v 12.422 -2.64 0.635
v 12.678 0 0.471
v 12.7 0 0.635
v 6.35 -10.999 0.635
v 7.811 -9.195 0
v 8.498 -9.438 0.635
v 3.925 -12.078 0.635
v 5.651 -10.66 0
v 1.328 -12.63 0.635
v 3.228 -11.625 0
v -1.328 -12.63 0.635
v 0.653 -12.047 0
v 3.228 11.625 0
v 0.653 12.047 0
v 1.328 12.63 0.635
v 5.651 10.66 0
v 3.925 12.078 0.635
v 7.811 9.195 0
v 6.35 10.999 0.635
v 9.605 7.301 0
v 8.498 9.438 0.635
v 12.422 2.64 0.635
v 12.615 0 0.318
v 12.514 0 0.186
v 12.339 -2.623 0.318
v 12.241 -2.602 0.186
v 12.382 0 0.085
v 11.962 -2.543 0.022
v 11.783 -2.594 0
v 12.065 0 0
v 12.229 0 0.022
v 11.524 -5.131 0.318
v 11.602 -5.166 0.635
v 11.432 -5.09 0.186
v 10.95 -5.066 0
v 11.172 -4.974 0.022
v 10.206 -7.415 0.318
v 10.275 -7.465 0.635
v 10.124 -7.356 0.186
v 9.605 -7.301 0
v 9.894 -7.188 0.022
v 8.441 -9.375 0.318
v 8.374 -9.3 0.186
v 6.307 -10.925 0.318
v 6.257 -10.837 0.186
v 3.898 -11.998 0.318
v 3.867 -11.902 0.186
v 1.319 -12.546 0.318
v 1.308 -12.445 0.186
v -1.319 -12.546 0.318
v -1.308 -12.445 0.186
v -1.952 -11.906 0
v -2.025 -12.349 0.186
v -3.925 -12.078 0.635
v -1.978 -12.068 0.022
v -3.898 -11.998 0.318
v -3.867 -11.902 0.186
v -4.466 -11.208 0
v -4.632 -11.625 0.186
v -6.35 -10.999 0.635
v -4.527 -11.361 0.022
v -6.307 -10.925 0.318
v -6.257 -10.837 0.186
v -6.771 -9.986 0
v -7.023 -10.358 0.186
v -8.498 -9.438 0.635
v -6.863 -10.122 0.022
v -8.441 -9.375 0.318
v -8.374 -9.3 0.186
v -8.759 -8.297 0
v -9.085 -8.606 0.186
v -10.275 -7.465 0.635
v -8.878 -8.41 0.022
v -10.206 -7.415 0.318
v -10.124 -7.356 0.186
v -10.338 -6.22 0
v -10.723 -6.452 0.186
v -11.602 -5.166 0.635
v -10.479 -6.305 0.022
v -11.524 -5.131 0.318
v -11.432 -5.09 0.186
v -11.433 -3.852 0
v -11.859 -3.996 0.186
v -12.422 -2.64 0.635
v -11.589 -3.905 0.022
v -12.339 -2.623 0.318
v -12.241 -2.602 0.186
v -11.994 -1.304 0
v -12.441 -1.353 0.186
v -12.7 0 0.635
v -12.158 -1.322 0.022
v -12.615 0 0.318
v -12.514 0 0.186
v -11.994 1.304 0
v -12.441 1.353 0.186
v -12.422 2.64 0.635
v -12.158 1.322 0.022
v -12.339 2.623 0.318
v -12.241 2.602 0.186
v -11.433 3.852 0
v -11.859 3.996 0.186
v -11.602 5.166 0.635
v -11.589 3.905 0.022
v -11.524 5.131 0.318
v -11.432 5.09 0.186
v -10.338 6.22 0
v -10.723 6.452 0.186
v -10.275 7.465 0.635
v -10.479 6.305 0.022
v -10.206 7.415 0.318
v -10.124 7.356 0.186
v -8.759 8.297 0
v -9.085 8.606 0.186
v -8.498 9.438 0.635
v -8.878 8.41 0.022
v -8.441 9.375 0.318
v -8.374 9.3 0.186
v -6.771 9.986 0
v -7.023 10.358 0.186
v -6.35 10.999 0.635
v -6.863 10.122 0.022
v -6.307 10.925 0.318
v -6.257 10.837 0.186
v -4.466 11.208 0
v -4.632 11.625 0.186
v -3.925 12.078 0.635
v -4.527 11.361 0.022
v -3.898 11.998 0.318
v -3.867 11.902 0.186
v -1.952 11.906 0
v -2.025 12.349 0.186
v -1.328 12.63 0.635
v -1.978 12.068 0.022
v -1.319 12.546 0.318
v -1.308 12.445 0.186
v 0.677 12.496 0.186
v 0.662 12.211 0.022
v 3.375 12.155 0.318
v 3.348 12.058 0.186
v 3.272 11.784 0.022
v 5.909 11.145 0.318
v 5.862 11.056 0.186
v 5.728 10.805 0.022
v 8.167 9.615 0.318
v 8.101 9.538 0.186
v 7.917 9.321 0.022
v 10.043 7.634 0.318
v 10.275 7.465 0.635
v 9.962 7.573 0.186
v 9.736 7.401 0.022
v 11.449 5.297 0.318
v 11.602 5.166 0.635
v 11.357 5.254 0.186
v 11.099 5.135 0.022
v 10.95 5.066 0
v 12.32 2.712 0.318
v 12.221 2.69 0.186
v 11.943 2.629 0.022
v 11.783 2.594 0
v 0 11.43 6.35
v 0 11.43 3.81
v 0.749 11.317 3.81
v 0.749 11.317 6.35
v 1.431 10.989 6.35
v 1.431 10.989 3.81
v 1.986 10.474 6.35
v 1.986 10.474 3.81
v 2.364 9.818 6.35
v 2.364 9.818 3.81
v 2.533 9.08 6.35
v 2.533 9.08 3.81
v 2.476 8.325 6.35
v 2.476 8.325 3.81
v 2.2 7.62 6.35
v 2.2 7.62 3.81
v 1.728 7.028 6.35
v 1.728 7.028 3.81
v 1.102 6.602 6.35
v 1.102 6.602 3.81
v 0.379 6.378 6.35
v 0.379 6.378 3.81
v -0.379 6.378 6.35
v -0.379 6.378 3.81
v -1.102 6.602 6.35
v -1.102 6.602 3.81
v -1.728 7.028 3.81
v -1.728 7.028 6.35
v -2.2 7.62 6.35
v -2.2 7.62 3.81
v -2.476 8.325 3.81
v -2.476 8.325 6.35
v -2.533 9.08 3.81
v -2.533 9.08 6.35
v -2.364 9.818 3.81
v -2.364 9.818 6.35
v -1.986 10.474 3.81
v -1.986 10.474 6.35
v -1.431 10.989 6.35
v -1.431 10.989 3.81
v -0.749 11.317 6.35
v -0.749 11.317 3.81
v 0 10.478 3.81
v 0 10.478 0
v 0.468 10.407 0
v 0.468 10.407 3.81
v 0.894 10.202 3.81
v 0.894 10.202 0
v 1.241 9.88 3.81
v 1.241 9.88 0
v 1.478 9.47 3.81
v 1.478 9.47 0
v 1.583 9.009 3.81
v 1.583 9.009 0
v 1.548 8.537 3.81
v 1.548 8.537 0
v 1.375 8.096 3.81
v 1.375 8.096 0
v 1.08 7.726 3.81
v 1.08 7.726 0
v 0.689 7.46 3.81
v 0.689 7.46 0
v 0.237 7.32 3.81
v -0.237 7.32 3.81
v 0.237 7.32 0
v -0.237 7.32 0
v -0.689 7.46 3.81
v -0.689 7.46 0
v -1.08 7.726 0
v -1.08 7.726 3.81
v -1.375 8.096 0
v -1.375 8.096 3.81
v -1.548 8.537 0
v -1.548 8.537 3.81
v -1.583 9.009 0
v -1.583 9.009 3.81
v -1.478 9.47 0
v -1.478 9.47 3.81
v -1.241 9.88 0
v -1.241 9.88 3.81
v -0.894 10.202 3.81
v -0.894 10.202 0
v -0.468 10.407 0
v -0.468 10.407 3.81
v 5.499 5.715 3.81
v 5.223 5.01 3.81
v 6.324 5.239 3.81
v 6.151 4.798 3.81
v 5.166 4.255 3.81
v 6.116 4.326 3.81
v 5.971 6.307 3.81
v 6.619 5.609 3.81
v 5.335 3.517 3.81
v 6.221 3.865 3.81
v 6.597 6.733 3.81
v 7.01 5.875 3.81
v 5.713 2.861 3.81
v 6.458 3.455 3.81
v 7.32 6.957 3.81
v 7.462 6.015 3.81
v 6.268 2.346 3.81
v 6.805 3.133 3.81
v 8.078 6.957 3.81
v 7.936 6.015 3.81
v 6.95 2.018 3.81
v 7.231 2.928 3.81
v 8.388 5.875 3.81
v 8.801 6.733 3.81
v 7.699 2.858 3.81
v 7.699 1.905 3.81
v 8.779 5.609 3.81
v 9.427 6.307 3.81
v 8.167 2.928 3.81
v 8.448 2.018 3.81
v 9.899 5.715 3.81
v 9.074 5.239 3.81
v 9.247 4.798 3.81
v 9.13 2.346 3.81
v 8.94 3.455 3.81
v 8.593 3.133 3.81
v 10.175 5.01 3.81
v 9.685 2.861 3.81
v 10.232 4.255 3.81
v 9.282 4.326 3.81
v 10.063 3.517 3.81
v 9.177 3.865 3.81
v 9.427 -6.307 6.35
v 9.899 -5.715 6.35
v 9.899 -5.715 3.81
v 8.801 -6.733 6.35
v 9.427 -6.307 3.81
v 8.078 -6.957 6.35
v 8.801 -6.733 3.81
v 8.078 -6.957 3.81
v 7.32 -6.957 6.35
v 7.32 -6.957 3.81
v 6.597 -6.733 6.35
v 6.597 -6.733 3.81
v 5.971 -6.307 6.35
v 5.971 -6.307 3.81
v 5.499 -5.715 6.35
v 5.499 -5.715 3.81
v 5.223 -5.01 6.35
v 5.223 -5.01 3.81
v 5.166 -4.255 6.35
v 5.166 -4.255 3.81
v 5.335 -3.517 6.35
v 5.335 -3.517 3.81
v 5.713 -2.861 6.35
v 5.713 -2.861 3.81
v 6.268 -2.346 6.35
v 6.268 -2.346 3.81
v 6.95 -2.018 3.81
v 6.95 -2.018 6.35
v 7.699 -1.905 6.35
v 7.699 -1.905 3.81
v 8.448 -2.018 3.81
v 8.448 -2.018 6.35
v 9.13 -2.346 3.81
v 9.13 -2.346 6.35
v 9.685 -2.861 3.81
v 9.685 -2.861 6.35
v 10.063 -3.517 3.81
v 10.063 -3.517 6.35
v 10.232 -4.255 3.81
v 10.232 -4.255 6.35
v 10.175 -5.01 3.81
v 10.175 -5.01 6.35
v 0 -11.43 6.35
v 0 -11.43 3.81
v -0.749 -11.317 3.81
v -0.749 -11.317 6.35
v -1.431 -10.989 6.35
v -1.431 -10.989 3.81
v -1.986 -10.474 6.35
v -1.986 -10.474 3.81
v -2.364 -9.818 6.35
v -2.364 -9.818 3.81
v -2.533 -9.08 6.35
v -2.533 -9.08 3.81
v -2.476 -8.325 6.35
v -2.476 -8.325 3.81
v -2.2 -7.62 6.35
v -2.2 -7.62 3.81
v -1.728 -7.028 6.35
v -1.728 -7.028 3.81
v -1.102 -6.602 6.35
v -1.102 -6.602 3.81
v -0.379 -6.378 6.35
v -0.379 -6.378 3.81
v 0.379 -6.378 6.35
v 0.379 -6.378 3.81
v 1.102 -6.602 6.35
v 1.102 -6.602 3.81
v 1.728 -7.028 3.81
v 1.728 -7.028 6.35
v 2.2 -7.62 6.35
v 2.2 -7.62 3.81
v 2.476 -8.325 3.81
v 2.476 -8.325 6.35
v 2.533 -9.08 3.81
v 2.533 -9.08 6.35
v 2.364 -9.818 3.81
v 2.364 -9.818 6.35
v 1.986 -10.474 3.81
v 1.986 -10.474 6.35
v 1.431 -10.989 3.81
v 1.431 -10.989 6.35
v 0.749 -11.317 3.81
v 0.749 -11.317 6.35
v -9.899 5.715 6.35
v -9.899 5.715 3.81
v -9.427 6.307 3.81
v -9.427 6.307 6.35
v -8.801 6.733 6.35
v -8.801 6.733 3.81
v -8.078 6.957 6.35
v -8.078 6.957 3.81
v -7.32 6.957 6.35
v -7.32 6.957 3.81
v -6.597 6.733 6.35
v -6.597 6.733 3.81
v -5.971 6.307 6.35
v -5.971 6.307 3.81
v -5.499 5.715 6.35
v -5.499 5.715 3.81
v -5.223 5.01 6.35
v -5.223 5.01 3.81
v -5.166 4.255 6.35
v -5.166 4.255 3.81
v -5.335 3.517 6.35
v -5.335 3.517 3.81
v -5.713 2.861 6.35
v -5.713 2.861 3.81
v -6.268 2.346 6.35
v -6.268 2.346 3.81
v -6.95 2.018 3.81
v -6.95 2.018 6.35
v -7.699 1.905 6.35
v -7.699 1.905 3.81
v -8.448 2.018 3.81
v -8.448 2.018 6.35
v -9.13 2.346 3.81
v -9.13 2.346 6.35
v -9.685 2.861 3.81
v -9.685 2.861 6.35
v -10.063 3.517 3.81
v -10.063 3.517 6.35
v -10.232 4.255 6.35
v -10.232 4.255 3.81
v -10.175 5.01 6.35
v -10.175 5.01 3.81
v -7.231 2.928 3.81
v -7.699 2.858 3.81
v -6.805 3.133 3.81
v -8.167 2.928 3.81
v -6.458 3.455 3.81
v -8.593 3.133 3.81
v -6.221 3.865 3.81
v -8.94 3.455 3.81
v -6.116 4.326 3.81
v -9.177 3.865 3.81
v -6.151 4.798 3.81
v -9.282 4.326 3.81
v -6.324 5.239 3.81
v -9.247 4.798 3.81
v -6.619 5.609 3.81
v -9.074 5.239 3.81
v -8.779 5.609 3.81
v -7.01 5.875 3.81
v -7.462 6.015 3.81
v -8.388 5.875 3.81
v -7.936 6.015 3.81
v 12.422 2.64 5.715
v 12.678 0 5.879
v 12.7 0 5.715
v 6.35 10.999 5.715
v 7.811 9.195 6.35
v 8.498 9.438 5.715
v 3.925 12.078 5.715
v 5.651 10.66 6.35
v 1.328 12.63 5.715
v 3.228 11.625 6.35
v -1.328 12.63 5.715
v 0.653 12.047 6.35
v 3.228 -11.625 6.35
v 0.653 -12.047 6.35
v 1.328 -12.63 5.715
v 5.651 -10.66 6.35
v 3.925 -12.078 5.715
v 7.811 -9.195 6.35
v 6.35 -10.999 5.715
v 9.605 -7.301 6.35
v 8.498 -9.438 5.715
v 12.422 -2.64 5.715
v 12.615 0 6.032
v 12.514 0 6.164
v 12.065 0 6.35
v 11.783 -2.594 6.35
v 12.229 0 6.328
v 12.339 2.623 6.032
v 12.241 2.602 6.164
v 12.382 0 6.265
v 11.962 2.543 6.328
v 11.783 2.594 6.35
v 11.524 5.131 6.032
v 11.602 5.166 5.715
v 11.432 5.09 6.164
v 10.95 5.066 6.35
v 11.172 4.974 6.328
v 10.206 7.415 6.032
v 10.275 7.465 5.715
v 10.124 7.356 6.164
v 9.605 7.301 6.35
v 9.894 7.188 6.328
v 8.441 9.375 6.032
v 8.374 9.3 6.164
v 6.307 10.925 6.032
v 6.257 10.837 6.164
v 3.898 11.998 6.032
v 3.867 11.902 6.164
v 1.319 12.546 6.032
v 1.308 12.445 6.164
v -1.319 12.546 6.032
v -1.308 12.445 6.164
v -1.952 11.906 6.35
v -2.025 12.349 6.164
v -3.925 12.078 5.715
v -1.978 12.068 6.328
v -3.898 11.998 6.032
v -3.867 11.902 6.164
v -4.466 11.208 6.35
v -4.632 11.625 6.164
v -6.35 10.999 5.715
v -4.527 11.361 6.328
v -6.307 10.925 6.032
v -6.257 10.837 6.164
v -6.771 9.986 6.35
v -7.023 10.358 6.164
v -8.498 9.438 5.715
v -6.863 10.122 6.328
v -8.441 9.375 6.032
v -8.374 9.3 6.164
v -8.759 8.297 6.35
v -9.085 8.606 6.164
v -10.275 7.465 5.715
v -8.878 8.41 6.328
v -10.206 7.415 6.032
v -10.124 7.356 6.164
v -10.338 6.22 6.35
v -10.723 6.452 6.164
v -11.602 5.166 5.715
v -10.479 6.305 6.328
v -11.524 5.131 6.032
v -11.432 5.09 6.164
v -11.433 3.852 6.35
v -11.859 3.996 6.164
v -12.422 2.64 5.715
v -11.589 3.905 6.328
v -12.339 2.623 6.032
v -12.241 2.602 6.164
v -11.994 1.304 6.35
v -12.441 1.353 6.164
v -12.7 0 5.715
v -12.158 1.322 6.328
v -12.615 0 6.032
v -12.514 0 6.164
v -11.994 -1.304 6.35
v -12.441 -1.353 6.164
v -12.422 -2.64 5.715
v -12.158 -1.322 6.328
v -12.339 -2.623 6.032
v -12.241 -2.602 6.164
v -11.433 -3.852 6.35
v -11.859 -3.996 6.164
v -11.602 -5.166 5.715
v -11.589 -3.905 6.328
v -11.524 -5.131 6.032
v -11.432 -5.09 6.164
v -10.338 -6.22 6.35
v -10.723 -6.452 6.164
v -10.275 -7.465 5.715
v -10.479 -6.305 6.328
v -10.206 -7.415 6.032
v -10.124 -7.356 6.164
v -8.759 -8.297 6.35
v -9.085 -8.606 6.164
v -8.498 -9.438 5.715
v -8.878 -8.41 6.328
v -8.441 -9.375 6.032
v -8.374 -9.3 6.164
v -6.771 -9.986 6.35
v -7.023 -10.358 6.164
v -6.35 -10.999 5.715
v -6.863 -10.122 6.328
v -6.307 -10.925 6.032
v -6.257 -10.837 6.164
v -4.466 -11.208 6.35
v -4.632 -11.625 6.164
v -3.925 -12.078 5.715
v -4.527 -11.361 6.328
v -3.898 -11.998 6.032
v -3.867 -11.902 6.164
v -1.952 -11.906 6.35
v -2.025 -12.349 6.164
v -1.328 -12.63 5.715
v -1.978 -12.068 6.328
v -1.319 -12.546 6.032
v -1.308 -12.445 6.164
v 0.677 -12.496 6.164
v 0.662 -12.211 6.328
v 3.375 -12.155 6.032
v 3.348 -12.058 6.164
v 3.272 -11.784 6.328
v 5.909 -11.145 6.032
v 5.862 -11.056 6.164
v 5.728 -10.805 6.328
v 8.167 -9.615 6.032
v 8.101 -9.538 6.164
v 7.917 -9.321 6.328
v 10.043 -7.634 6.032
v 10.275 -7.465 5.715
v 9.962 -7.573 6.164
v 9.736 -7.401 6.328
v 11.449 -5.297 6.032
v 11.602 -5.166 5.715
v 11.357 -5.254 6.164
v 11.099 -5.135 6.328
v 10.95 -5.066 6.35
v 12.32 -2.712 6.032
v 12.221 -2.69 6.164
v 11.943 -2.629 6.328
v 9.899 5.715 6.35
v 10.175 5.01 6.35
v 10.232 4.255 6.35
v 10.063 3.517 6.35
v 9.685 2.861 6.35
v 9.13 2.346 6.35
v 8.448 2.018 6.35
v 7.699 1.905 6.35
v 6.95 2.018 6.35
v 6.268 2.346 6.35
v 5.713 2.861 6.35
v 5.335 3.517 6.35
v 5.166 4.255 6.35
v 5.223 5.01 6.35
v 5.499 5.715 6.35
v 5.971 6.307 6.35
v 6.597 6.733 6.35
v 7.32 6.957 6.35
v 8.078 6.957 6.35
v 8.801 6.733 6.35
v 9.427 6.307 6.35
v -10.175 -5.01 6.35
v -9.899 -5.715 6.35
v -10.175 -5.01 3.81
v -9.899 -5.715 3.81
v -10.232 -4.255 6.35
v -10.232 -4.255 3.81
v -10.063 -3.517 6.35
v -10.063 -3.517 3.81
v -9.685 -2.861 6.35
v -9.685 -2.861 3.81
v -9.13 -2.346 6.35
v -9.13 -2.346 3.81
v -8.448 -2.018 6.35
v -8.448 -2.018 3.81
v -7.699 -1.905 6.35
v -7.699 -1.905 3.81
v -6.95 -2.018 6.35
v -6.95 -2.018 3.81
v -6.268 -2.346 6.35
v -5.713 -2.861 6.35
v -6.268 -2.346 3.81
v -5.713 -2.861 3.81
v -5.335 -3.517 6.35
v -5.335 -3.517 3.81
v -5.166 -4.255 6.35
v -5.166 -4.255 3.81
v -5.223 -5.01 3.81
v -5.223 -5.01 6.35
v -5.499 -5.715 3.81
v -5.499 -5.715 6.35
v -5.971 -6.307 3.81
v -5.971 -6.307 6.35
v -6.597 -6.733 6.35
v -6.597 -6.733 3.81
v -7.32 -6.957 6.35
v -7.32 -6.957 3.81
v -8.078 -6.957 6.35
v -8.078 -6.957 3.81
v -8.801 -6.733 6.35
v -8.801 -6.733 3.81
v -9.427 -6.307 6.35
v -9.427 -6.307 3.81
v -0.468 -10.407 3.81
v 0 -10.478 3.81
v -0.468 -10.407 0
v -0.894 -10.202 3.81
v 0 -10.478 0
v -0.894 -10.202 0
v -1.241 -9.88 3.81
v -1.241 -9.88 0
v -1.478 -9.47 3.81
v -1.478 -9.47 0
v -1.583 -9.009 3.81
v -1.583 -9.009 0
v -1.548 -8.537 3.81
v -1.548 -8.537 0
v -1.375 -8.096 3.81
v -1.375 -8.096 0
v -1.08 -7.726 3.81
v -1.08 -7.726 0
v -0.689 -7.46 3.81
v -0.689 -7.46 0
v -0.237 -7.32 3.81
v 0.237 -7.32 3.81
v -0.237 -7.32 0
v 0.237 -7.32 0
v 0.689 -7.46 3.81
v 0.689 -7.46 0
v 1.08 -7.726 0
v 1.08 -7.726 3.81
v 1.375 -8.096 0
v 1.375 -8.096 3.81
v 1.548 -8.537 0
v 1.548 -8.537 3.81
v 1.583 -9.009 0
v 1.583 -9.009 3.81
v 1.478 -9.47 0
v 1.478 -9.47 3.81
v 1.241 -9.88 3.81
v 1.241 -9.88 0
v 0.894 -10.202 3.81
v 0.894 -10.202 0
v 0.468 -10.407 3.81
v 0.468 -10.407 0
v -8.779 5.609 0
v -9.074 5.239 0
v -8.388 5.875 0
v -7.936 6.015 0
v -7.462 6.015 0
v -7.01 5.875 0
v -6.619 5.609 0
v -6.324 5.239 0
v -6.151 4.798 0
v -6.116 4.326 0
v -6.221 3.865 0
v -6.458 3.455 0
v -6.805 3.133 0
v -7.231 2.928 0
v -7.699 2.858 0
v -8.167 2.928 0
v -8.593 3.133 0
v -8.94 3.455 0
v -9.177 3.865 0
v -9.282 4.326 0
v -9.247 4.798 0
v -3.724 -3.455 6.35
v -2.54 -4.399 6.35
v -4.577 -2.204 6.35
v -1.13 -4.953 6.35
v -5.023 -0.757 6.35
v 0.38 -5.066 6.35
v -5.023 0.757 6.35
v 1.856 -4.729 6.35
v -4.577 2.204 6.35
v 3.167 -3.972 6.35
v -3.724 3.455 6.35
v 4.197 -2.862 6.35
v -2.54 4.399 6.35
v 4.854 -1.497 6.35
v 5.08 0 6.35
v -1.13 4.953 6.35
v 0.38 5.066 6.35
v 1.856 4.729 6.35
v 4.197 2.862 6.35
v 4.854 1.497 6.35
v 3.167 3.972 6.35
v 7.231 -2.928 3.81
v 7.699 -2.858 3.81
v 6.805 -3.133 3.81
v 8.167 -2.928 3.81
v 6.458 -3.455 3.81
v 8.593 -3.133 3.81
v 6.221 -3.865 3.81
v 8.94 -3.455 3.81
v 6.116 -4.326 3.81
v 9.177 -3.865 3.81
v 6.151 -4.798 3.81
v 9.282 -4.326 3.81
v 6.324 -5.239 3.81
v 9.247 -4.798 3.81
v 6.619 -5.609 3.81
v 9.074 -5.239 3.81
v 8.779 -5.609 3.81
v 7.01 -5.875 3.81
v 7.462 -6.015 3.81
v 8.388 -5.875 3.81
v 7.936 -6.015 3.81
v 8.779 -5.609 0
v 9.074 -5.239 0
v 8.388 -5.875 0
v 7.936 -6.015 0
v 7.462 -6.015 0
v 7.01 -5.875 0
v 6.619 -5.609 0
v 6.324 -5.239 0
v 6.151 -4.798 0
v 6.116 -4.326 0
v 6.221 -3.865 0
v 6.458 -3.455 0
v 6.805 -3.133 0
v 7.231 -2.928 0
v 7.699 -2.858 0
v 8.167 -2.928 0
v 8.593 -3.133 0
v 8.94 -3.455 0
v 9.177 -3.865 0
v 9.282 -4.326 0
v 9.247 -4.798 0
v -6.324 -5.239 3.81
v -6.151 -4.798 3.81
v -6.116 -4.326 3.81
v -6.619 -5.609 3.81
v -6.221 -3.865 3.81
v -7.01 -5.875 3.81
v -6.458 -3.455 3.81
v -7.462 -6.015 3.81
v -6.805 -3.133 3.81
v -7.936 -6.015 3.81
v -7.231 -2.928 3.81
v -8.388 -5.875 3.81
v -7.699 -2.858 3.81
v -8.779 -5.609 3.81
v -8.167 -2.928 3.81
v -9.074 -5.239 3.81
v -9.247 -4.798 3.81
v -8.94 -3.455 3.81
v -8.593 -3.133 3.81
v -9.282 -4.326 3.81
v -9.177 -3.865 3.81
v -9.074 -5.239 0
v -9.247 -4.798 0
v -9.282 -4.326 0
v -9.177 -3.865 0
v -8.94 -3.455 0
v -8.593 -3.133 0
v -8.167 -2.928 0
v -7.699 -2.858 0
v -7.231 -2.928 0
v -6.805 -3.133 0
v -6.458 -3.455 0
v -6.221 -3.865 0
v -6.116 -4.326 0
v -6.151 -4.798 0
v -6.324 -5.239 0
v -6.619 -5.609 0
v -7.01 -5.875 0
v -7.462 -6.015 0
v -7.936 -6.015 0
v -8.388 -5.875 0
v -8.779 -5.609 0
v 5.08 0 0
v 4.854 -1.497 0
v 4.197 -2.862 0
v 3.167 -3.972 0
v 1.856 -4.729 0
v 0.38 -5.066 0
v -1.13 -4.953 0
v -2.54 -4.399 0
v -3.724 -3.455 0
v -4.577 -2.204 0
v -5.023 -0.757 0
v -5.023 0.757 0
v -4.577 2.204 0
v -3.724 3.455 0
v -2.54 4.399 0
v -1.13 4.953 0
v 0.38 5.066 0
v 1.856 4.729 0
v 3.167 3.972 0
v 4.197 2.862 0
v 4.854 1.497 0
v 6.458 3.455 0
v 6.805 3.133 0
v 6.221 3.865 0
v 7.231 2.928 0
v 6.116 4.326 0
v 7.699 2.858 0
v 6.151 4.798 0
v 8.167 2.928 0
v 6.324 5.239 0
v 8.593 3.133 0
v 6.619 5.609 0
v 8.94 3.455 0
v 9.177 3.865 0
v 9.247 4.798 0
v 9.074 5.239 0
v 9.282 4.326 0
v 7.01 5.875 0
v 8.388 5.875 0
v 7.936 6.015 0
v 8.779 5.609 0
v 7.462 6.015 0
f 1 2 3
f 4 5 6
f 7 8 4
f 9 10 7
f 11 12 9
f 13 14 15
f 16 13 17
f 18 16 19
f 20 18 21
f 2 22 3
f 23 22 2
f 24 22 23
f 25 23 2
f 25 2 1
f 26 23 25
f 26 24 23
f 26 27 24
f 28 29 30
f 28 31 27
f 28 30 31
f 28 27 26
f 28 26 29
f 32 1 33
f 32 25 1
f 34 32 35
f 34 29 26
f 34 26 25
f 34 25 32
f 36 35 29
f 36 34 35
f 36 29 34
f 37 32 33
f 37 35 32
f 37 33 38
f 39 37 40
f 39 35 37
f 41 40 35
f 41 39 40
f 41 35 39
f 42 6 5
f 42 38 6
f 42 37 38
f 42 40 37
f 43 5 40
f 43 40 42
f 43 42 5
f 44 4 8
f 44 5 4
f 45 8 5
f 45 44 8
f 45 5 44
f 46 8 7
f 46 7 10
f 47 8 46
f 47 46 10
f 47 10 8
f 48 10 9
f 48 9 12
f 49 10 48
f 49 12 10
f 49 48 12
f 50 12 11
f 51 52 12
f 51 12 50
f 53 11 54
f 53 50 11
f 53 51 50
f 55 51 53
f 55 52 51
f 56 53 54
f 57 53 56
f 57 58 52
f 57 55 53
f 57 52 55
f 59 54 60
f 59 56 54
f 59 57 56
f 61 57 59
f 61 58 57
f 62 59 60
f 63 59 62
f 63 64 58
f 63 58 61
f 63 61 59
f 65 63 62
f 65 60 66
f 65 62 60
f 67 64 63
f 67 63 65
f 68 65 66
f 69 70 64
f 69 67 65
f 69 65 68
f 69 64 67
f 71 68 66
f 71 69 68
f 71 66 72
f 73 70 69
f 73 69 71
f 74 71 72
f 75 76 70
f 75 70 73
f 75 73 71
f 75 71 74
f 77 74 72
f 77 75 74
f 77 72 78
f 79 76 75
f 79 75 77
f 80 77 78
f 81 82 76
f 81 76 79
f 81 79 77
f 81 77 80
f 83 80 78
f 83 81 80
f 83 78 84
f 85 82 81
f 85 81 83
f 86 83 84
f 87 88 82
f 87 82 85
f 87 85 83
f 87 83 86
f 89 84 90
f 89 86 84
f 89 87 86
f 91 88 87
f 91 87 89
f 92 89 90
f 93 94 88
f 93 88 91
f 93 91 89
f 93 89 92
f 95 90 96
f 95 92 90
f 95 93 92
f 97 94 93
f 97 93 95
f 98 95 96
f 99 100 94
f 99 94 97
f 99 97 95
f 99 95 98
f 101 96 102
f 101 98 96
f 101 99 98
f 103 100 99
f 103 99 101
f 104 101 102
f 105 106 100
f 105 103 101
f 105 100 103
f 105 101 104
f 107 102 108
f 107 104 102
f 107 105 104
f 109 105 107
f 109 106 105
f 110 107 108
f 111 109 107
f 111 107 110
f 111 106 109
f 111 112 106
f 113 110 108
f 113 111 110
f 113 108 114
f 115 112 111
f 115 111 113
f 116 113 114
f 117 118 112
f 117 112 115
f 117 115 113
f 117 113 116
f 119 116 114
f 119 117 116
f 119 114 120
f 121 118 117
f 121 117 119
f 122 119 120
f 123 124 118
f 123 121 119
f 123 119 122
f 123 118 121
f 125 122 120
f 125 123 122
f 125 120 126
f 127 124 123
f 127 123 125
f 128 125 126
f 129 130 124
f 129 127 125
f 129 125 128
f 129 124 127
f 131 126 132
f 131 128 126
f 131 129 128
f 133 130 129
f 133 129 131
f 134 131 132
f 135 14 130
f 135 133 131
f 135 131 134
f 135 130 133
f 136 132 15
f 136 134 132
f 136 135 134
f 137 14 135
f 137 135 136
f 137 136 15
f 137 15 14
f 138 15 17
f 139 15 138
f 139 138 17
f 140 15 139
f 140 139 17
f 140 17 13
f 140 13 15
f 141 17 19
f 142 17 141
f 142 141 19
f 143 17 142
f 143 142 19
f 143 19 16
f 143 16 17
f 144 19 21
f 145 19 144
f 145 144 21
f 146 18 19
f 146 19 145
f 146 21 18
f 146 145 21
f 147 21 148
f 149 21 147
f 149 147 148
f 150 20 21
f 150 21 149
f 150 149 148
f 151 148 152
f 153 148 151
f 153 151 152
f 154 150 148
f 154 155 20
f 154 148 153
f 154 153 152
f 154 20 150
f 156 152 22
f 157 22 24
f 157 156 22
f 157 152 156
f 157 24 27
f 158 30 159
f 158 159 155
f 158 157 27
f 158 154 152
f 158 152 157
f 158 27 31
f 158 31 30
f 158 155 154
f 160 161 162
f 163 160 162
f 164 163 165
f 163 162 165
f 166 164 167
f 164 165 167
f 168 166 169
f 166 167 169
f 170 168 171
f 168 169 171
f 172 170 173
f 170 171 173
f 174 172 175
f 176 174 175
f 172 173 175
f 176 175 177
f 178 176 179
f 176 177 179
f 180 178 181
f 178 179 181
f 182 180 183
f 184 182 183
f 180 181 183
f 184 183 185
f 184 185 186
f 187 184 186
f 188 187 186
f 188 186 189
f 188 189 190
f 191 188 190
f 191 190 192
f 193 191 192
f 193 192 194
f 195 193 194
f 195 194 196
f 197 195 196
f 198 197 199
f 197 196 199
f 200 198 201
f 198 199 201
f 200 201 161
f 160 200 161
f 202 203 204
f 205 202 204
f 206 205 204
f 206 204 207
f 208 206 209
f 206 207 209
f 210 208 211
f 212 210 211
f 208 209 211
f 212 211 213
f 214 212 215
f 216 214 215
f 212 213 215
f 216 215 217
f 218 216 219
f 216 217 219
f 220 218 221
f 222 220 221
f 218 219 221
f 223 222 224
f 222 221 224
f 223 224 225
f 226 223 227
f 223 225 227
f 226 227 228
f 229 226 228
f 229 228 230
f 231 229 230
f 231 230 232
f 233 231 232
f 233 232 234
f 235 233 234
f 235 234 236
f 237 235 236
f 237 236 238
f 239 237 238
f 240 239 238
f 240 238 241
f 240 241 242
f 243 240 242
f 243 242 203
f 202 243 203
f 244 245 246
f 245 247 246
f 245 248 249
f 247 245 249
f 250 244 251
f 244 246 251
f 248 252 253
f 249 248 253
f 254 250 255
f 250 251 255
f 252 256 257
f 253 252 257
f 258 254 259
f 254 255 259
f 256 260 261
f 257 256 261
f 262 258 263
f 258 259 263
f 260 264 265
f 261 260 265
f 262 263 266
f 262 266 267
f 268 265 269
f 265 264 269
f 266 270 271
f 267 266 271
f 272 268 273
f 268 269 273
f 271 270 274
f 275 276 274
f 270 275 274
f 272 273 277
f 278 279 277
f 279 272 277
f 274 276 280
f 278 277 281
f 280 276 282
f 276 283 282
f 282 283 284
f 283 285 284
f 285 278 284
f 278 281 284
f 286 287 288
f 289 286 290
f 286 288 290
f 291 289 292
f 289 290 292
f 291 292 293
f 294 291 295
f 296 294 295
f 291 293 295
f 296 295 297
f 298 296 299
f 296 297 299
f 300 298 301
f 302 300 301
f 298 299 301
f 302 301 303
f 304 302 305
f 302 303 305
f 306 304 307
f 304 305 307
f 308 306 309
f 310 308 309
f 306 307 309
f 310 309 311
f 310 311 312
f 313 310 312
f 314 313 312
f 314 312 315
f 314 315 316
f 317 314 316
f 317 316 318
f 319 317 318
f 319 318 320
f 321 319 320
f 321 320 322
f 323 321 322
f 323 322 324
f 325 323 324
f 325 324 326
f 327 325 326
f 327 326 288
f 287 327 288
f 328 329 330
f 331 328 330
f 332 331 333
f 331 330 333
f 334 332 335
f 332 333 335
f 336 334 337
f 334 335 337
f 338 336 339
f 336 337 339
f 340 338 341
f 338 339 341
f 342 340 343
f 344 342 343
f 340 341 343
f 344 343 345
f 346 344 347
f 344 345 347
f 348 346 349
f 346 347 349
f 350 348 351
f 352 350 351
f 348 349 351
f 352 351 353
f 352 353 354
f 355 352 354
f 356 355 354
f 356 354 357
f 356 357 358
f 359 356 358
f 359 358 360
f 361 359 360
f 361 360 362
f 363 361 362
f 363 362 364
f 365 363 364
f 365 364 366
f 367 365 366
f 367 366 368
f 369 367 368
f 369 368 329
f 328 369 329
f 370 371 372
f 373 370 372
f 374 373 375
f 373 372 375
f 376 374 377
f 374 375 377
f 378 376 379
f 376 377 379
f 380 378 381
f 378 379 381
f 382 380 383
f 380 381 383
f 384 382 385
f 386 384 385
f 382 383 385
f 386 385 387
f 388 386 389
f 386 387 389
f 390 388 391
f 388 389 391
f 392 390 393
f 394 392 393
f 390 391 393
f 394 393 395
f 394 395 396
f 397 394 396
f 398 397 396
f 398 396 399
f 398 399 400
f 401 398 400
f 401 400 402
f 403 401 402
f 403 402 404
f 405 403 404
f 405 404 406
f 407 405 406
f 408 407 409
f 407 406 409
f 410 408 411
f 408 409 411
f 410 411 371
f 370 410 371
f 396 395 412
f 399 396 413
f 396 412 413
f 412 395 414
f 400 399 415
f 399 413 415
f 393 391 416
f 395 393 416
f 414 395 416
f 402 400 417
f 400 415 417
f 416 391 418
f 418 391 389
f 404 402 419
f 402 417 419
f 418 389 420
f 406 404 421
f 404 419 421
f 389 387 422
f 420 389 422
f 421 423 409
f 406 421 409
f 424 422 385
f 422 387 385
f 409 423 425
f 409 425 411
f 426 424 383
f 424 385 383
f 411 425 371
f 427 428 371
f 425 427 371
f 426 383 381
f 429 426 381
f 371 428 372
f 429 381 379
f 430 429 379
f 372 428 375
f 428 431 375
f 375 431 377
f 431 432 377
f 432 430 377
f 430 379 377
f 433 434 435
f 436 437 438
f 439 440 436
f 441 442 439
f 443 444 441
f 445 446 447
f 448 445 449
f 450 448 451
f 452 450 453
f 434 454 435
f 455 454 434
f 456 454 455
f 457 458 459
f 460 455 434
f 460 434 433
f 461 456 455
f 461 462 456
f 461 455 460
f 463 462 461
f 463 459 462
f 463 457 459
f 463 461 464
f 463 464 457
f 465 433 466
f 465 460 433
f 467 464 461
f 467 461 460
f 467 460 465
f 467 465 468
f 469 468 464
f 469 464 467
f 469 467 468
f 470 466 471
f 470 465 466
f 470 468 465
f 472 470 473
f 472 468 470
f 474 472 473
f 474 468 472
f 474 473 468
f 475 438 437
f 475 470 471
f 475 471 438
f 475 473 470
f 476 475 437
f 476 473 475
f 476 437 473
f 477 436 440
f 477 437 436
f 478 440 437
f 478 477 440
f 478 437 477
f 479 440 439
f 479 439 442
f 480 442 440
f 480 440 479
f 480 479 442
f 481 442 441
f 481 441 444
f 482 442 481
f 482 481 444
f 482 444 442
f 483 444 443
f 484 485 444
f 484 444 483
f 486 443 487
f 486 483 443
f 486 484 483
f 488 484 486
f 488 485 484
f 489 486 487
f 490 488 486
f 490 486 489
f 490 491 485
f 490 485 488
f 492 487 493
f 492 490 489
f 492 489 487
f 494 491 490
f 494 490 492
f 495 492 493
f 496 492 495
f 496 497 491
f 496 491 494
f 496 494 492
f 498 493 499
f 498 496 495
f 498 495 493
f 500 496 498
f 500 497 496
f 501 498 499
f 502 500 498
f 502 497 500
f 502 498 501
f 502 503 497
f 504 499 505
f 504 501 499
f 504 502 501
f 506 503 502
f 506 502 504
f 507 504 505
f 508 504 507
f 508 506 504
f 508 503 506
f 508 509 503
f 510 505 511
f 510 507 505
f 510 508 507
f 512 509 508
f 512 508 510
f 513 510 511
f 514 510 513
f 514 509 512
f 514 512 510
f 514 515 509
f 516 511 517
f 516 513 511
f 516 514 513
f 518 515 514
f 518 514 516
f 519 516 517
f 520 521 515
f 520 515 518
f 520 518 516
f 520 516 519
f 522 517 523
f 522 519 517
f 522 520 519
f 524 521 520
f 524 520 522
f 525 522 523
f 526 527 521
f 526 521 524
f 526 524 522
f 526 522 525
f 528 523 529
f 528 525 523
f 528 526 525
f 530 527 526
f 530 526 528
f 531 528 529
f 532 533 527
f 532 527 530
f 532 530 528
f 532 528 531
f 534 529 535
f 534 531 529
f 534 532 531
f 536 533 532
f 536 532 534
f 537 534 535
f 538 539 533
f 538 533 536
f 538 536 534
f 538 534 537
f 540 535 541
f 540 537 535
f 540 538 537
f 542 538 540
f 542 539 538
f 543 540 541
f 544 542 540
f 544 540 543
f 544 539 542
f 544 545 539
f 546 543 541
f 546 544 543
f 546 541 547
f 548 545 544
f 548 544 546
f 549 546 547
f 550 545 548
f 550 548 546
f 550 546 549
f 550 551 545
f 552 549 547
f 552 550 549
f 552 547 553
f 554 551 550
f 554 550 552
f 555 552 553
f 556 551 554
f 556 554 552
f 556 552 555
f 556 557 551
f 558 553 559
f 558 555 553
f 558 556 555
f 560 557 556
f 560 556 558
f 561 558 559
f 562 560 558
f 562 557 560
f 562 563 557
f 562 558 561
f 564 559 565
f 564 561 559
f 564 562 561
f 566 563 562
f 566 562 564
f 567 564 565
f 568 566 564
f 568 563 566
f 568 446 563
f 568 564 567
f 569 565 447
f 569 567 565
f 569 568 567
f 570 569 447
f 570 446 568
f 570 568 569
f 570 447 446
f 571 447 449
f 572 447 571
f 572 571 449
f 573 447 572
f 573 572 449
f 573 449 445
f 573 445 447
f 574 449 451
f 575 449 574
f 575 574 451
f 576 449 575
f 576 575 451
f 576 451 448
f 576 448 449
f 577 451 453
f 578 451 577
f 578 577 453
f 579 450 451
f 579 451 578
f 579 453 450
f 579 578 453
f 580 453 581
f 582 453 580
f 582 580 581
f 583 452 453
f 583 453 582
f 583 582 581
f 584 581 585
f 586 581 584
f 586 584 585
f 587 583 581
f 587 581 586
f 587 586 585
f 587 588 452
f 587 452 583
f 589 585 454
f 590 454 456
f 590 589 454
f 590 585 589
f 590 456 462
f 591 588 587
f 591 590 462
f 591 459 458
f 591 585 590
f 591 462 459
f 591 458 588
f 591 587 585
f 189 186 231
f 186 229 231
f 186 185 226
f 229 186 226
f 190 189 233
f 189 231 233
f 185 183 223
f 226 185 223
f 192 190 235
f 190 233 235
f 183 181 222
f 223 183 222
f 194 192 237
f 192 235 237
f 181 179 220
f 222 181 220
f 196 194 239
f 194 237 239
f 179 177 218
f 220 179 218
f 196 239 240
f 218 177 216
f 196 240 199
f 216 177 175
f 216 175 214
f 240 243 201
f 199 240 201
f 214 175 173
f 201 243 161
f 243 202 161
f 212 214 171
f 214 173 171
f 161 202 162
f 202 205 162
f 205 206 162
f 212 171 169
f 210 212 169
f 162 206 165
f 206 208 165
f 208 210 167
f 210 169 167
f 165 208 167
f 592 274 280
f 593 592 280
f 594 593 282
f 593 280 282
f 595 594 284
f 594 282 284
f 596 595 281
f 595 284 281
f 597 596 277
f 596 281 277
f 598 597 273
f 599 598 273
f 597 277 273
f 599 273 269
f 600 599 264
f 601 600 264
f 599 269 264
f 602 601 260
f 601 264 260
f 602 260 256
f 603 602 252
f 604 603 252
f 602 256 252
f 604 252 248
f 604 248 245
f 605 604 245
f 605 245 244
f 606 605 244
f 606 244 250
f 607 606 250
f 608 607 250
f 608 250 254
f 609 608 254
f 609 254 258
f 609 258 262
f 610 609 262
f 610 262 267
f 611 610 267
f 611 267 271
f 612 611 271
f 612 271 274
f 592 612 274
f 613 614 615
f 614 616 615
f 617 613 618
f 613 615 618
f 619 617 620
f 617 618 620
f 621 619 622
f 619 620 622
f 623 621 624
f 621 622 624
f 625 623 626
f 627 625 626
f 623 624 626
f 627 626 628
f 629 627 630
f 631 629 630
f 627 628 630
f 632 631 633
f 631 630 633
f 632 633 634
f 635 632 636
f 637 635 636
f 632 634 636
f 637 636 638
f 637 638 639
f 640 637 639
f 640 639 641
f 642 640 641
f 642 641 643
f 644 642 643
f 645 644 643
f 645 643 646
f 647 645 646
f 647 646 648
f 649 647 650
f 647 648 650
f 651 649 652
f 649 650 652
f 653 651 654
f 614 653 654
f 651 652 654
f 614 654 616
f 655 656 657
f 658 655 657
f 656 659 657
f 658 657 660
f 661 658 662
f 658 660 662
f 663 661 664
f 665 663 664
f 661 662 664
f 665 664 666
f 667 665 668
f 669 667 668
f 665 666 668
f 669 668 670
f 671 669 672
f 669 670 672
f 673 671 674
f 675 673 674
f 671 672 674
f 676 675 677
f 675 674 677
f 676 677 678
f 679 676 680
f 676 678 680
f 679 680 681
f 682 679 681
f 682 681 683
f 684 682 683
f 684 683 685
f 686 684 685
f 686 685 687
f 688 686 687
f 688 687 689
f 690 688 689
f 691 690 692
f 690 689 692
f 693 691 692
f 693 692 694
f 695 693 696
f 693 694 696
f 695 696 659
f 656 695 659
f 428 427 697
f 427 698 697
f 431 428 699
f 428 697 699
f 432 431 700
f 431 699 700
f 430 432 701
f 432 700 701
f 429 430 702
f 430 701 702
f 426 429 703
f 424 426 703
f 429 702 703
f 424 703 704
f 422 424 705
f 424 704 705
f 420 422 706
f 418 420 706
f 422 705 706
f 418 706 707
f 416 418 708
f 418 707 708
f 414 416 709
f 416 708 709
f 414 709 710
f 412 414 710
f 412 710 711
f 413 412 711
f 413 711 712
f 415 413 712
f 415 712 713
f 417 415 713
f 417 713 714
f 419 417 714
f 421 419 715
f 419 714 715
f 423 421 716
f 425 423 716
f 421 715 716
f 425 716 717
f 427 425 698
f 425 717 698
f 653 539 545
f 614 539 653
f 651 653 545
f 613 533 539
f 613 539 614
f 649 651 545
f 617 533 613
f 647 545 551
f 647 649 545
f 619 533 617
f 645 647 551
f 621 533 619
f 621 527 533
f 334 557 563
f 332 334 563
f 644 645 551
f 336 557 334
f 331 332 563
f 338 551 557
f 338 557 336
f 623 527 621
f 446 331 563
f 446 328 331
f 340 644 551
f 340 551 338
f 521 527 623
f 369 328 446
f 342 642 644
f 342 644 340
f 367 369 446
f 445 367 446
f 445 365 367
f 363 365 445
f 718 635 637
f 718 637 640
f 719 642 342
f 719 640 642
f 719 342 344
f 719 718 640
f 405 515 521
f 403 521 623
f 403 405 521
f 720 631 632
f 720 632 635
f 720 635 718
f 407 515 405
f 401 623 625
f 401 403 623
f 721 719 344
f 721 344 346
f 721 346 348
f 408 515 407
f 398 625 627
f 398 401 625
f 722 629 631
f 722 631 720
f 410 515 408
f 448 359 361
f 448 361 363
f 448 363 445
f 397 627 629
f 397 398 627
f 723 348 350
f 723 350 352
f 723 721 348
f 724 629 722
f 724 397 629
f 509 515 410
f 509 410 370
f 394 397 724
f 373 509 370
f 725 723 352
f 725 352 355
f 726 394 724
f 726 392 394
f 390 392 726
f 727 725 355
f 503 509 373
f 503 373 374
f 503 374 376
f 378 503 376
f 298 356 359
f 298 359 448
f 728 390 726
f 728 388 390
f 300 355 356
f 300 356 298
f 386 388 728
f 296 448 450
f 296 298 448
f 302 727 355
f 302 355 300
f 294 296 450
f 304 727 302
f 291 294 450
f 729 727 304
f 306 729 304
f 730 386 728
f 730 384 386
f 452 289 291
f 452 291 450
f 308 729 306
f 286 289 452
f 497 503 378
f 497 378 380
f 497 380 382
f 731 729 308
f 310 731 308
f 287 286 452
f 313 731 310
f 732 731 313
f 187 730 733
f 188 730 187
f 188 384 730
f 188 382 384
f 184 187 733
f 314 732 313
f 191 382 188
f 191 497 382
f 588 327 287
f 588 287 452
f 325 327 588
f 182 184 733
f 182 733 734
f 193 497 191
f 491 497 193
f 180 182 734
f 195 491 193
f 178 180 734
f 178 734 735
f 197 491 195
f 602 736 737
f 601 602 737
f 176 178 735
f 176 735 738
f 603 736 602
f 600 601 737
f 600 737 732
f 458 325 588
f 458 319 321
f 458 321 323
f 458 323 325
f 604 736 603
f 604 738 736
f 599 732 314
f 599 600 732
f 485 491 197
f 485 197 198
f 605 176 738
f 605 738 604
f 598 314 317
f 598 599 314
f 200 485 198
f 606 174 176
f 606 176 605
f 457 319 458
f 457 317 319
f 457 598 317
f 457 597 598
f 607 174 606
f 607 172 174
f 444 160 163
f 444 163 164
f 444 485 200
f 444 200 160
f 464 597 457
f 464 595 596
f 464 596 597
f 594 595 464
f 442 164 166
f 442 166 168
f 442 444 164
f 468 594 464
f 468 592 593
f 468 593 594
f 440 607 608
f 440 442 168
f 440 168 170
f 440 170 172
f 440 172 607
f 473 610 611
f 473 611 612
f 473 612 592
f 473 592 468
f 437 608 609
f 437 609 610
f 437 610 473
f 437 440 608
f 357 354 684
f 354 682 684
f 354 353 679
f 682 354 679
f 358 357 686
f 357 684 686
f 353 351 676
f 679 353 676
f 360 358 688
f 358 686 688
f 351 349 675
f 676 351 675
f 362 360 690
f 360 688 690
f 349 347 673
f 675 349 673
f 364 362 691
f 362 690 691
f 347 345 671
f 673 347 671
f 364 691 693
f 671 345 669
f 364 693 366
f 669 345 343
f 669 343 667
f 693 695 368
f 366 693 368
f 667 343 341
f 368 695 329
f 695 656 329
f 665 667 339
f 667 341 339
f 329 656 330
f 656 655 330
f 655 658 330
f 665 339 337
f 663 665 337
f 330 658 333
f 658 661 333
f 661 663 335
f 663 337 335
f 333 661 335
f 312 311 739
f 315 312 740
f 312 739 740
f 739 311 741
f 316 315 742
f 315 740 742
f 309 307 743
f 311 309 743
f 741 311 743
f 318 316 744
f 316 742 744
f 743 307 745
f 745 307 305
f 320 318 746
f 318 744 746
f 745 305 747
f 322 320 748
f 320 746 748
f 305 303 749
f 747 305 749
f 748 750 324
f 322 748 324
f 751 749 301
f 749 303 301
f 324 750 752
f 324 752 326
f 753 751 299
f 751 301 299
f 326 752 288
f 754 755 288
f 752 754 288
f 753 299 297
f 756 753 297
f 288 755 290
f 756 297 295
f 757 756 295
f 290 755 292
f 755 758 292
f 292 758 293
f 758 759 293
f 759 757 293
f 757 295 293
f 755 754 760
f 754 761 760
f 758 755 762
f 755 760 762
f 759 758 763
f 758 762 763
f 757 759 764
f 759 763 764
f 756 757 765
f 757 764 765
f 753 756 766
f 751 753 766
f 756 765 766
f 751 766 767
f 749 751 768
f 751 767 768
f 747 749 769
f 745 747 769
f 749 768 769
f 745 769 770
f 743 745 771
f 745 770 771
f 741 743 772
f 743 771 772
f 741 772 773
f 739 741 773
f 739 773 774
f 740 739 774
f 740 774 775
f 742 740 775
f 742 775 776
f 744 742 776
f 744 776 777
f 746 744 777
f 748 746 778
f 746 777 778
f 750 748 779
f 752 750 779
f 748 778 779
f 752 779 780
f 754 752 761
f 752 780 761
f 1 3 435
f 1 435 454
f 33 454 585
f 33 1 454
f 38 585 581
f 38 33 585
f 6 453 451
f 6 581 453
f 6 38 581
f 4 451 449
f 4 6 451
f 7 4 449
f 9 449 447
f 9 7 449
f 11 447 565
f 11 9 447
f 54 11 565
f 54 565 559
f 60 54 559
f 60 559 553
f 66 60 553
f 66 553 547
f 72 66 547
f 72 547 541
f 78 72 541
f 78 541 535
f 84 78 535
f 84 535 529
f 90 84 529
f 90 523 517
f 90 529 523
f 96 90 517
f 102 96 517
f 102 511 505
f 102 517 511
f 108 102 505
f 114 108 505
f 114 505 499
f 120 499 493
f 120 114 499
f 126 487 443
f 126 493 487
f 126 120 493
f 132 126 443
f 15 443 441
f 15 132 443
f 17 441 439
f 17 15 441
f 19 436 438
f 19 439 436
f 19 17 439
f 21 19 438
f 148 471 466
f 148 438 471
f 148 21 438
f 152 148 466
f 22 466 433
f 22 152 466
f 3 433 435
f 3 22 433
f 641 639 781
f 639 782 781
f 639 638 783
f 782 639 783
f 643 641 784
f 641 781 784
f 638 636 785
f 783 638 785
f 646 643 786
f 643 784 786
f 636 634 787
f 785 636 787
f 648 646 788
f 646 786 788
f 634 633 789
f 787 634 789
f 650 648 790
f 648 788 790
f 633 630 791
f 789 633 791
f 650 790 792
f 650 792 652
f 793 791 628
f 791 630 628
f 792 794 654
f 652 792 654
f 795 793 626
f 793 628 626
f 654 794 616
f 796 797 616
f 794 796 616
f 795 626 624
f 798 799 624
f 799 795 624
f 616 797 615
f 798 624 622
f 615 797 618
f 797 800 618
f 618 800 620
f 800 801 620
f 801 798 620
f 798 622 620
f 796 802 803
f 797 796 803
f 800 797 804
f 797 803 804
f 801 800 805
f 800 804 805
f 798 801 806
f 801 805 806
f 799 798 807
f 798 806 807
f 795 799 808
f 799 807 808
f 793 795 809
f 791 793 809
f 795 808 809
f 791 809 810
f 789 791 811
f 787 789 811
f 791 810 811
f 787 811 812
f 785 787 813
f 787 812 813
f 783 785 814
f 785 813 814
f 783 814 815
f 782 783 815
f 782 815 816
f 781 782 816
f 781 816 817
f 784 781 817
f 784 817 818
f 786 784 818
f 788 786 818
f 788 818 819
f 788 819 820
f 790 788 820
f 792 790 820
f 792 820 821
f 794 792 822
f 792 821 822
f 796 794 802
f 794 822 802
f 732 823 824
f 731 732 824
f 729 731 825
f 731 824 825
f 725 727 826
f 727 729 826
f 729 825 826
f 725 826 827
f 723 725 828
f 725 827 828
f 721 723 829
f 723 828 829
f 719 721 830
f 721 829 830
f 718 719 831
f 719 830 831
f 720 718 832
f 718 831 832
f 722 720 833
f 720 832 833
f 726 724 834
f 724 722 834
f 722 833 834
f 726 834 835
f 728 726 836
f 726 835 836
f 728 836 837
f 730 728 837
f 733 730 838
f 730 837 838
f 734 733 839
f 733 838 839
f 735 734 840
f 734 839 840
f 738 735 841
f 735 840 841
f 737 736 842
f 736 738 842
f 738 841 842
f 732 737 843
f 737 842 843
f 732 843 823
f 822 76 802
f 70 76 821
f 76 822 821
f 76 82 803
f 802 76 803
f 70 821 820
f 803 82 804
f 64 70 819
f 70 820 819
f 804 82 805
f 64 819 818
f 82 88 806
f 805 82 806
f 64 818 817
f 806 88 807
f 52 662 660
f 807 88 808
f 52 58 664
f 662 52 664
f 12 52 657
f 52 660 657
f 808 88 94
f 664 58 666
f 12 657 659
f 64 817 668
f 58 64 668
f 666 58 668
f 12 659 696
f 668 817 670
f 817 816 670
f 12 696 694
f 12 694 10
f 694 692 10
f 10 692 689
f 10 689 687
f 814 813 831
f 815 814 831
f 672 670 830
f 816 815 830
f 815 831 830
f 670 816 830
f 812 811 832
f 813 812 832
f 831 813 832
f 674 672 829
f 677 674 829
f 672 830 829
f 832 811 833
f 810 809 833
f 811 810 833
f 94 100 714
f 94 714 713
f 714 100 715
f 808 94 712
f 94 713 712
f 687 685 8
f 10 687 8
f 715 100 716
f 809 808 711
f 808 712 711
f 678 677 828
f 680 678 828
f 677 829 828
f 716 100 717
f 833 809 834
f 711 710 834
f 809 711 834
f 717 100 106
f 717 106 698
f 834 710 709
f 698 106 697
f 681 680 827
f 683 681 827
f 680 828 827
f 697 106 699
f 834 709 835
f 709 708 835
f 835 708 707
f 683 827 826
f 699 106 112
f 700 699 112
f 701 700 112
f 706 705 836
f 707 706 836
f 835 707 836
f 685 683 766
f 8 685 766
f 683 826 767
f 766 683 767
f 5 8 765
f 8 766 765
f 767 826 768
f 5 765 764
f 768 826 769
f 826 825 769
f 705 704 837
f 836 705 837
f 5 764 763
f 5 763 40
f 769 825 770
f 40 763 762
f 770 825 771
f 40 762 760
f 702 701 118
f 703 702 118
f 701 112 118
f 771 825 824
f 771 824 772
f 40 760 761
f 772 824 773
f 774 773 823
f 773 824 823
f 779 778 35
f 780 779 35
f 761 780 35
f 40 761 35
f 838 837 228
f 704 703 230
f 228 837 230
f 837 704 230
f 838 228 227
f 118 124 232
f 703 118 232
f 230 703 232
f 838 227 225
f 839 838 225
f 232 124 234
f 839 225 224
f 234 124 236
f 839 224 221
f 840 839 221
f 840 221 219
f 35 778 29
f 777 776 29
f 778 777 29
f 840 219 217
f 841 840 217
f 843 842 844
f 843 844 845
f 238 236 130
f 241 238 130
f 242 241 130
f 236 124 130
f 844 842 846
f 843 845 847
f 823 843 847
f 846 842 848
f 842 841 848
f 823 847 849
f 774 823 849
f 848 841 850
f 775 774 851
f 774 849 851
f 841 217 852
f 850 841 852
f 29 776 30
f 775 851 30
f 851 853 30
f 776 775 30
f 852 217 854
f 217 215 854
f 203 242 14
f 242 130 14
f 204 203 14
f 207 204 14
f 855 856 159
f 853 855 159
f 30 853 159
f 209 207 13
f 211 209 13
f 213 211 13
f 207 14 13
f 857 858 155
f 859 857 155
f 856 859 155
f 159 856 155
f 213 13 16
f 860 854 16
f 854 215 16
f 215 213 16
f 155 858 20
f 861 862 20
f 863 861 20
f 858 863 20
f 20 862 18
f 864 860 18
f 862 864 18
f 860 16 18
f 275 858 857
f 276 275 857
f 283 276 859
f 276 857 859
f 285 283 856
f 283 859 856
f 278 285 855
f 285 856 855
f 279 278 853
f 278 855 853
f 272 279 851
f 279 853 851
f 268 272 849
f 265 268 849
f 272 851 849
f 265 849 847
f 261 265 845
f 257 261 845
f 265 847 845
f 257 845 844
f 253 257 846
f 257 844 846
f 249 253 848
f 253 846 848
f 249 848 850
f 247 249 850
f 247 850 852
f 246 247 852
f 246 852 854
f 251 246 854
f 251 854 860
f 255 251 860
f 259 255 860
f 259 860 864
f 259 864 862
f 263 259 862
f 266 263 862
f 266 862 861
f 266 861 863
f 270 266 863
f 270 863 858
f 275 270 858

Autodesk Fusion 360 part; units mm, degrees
sketch "Sketch1" plane through (0, 0, 0) normal (0, 0, 1) x (1, 0, 0)
  circle A0 centre (0, 0) radius 12.7
  circle A1 centre (0, 0) radius 5.08
  dimension "d1" = 25.4
  dimension "d3" = 10.16
extrude "Extrude1" add sketch "Sketch1" along normal blind 6.35
sketch "Sketch3" plane through (0, 0, 6.35) normal (0, 0, 1) x (-1, 0, 0)
  circle A0 centre (0, 0) radius 5.08
  circle A1 centre (0, 0) radius 12.7
  line L0 (0, 5.08) -> (0, 12.7)
  circle A2 centre (0, 0) radius 8.89
  point P0 (0, 8.89)
hole "Hole1" at (0, -8.89, 6.35) direction (0, 0, -1) diameter 3.175 depth 6.35 tip angle 180 counterbore diameter 5.08 counterbore depth 2.54
pattern_circular "C-Pattern1" count 6 over 360 about axis through (0, 0, 0) along (0, 0, 1) of "Hole1"
fillet "Fillet1" radius 0.635 2 edges at (-11.8406, -4.5925, 6.35) (-11.8406, -4.5925, 0)
